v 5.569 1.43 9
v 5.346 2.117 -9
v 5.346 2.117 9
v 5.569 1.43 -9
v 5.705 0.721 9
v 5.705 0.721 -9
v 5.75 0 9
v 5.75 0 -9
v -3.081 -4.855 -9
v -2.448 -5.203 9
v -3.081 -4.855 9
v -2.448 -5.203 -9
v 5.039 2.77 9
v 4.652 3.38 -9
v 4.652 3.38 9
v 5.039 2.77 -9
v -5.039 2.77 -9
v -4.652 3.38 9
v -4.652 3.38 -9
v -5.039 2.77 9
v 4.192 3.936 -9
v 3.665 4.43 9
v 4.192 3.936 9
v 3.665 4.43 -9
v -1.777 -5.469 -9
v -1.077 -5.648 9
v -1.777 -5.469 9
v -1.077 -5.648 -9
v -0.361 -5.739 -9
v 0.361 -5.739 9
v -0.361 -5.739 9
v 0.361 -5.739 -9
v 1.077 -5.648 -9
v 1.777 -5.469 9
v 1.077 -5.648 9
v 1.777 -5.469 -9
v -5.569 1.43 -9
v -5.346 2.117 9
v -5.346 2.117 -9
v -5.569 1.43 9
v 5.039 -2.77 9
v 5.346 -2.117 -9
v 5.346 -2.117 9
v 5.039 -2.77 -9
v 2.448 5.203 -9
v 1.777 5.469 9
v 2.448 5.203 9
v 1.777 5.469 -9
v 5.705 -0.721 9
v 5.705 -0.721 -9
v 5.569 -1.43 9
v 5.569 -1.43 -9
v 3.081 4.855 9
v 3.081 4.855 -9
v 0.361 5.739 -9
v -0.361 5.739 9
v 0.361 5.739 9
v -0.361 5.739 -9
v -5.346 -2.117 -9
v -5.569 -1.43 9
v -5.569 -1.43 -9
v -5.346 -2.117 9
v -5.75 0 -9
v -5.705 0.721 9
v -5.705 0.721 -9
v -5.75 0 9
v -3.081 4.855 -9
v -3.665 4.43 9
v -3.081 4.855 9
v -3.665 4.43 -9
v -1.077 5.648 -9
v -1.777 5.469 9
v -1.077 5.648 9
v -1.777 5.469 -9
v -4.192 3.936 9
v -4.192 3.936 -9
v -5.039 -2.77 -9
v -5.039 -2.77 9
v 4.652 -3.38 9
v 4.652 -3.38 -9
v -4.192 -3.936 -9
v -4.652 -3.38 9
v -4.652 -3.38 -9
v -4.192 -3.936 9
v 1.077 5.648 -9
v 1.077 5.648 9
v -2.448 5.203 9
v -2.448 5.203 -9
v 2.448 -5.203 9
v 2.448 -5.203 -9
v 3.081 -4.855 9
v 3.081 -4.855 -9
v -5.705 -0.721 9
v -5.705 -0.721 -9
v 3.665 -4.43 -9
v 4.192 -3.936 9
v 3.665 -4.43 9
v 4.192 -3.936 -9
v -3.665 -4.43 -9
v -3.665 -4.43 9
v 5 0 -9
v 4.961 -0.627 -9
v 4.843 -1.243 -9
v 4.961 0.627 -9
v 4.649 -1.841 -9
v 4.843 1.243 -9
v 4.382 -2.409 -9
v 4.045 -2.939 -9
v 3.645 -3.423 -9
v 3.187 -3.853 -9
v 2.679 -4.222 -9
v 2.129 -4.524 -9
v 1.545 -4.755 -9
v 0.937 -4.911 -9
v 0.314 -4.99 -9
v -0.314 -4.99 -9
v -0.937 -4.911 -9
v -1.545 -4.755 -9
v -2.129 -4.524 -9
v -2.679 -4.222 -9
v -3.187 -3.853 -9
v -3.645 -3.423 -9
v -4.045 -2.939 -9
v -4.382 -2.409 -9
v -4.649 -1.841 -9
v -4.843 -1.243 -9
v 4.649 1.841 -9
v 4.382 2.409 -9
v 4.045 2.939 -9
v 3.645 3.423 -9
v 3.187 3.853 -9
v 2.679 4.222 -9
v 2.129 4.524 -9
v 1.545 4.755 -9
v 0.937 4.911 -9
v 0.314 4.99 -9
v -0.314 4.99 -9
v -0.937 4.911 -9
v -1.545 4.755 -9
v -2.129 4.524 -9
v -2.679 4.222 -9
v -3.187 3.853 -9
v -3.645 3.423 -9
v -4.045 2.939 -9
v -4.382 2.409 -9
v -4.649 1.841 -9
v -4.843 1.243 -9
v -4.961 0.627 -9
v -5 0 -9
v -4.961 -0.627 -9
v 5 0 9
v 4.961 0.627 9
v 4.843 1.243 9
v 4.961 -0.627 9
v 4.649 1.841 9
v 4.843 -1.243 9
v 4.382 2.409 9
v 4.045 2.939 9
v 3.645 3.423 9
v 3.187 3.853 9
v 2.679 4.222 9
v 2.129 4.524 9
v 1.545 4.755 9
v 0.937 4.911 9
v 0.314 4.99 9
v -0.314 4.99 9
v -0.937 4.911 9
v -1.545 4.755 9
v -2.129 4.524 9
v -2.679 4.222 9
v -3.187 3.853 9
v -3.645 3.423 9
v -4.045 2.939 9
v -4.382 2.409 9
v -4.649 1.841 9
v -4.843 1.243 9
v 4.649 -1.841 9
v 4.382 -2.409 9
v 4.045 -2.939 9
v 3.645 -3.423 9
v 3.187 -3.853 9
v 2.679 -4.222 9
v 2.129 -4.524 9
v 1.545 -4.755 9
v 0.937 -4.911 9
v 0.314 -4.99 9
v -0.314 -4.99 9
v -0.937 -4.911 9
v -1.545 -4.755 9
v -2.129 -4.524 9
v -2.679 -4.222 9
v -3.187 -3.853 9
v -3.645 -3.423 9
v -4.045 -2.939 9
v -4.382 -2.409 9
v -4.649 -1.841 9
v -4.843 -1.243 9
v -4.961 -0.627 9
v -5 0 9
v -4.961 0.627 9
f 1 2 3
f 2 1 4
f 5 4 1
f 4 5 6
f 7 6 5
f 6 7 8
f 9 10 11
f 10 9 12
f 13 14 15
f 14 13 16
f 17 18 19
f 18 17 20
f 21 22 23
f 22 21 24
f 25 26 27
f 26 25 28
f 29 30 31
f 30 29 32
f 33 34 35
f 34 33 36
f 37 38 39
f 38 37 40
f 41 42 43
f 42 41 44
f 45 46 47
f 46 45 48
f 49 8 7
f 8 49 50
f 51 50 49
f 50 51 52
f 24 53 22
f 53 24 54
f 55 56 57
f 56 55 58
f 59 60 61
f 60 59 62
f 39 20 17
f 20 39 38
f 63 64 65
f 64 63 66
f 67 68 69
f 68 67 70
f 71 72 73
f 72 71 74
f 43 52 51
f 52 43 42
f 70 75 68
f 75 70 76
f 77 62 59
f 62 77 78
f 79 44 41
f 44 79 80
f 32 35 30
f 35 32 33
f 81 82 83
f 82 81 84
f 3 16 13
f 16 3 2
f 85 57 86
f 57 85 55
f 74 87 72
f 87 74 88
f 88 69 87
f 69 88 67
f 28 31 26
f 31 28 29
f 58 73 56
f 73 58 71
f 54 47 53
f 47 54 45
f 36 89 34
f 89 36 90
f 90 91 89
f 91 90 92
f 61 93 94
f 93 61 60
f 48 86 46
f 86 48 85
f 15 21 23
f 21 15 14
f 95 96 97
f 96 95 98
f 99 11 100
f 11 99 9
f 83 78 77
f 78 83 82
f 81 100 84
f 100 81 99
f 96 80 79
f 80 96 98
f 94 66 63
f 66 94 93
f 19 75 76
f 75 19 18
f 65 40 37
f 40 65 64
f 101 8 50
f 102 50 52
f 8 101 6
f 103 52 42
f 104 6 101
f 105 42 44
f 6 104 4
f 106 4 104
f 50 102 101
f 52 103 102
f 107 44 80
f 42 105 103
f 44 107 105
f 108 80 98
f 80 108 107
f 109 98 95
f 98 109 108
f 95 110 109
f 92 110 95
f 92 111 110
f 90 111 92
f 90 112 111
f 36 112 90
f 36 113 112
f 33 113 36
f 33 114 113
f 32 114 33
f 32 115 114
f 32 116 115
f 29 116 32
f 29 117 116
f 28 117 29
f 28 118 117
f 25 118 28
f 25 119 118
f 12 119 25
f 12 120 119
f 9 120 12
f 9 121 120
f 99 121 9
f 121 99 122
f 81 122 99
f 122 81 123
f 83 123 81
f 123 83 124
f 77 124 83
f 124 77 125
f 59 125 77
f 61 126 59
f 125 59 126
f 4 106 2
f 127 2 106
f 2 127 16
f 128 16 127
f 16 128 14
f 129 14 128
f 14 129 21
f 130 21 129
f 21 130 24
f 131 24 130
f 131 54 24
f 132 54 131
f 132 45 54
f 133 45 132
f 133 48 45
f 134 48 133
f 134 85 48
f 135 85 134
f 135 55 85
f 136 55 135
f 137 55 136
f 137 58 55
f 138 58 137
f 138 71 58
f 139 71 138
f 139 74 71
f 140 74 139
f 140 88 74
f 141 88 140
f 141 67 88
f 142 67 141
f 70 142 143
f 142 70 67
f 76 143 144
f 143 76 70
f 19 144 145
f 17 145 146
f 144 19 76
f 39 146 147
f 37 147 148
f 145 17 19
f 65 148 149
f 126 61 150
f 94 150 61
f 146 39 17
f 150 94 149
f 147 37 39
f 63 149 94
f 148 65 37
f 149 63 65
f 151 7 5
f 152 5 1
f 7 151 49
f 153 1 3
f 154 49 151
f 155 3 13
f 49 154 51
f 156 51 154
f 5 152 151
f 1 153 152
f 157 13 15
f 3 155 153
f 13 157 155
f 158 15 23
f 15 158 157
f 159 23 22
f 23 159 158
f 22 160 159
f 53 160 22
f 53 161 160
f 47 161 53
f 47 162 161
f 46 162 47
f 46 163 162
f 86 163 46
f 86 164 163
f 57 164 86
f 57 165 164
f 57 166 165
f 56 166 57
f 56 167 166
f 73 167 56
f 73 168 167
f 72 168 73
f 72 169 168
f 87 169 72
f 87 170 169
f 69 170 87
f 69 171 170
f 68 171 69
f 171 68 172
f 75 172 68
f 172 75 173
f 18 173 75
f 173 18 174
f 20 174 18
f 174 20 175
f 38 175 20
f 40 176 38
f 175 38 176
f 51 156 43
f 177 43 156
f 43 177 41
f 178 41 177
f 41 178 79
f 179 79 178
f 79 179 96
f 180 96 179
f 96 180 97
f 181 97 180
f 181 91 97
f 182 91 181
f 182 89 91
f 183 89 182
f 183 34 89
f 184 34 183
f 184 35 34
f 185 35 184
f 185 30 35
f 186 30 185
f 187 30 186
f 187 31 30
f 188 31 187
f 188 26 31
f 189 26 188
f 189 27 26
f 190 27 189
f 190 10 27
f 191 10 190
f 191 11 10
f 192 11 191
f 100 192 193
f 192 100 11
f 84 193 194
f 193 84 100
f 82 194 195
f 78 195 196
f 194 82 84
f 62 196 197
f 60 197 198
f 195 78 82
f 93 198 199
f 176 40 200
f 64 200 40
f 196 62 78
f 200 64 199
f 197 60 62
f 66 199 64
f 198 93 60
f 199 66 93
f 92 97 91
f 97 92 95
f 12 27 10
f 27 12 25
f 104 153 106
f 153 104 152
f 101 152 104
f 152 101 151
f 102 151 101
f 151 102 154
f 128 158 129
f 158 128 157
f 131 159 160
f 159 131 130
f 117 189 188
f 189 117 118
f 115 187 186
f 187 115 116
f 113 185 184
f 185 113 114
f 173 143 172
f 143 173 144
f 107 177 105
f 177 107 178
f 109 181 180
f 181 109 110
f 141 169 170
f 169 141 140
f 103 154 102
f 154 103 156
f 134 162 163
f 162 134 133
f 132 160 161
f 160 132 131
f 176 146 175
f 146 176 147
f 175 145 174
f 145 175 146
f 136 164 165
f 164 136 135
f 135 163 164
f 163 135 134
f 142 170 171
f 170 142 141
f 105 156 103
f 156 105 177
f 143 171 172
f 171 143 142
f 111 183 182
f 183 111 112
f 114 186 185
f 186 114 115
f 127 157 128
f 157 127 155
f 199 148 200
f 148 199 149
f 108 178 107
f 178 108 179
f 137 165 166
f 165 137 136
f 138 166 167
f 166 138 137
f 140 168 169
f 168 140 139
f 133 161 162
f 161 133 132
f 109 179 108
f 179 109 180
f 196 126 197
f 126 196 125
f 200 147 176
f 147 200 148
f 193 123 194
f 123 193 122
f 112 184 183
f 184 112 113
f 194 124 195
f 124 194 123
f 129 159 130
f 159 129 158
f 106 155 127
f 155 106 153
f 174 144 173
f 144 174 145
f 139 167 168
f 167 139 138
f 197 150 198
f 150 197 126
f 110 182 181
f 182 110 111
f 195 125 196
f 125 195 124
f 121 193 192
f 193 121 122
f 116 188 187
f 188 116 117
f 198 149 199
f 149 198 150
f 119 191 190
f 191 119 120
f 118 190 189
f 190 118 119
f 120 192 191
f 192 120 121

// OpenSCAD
$fn = 50;


difference() {
	union() {
		translate(v = [0, 0, -9.0000000000]) {
			cylinder(h = 18, r = 5.7500000000);
		}
	}
	union() {
		translate(v = [0, 0, -100.0000000000]) {
			cylinder(h = 200, r = 5.0000000000);
		}
	}
}
